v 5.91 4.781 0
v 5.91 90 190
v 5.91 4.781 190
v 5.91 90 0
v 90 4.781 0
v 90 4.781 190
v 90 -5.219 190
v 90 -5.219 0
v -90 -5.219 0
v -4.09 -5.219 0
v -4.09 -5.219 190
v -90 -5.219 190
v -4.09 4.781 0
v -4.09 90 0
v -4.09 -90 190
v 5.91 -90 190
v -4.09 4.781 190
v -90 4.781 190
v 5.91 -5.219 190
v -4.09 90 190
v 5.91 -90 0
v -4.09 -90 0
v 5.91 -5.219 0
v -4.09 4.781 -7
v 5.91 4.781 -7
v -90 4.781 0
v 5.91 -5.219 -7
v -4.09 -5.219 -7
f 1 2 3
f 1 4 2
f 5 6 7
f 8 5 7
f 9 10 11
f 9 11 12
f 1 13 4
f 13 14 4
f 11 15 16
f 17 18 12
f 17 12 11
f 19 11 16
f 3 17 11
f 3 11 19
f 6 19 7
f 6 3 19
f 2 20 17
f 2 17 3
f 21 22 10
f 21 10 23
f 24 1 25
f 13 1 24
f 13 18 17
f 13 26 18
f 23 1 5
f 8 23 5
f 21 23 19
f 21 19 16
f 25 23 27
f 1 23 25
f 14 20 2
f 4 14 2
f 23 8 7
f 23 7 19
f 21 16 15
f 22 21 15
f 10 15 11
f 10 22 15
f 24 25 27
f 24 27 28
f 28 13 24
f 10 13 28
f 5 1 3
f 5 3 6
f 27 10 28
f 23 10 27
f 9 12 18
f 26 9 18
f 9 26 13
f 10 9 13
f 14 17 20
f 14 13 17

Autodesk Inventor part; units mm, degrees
ref_plane "YZ Plane" through (0, 0, 0) normal (1, 0, 0) x (0, 1, 0)
ref_plane "XZ Plane" through (0, 0, 0) normal (0, 1, 0) x (-1, 0, 0)
ref_plane "XY Plane" through (0, 0, 0) normal (0, 0, 1) x (1, 0, 0)
sketch "Skizze1" plane through (0, 0, 0) normal (0, 0, 1) x (1, 0, 0)
  line L0 (-126, 0) -> (126, 0) projected
  line L1 (0, -126) -> (0, 126) projected
  line L2 (-90, 4.7809) -> (90, 4.7809)
  line L3 (90, 4.7809) -> (90, -5.2191)
  line L4 (90, -5.2191) -> (-90, -5.2191)
  line L5 (-90, -5.2191) -> (-90, 4.7809)
  line L6 (-4.0898, 90) -> (5.9102, 90)
  line L7 (5.9102, 90) -> (5.9102, -90)
  line L8 (5.9102, -90) -> (-4.0898, -90)
  line L9 (-4.0898, -90) -> (-4.0898, 90)
  point P0 (0, 0)
  point P1 (-4.0898, 4.7809)
  point P2 (-4.0898, -5.2191)
  point P3 (5.9102, -5.2191)
  point P4 (5.9102, 4.7809)
  dimension "d0" = 10
  dimension "d1" = 180
  dimension "d2" = 90
  dimension "d3" = 10
  dimension "d4" = 180
  dimension "d5" = 90
extrude "Extrusion1" add sketch "Skizze1" along normal blind 190
sketch "Skizze2" plane through (0, 0, 0) normal (0, 0, -1) x (-1, 0, 0)
  line L0 (-90, 4.7809) -> (-5.9102, 4.7809) projected
  line L1 (90, -5.2191) -> (4.0898, -5.2191) projected
  line L2 (-5.9102, 4.7809) -> (4.0898, 4.7809)
  line L3 (4.0898, 4.7809) -> (4.0898, -5.2191)
  line L4 (4.0898, -5.2191) -> (-5.9102, -5.2191)
  line L5 (-5.9102, -5.2191) -> (-5.9102, 4.7809)
  point P0 (0, 0)
extrude "Extrusion2" add sketch "Skizze2" along normal blind 7
properties part number "Gitter"
